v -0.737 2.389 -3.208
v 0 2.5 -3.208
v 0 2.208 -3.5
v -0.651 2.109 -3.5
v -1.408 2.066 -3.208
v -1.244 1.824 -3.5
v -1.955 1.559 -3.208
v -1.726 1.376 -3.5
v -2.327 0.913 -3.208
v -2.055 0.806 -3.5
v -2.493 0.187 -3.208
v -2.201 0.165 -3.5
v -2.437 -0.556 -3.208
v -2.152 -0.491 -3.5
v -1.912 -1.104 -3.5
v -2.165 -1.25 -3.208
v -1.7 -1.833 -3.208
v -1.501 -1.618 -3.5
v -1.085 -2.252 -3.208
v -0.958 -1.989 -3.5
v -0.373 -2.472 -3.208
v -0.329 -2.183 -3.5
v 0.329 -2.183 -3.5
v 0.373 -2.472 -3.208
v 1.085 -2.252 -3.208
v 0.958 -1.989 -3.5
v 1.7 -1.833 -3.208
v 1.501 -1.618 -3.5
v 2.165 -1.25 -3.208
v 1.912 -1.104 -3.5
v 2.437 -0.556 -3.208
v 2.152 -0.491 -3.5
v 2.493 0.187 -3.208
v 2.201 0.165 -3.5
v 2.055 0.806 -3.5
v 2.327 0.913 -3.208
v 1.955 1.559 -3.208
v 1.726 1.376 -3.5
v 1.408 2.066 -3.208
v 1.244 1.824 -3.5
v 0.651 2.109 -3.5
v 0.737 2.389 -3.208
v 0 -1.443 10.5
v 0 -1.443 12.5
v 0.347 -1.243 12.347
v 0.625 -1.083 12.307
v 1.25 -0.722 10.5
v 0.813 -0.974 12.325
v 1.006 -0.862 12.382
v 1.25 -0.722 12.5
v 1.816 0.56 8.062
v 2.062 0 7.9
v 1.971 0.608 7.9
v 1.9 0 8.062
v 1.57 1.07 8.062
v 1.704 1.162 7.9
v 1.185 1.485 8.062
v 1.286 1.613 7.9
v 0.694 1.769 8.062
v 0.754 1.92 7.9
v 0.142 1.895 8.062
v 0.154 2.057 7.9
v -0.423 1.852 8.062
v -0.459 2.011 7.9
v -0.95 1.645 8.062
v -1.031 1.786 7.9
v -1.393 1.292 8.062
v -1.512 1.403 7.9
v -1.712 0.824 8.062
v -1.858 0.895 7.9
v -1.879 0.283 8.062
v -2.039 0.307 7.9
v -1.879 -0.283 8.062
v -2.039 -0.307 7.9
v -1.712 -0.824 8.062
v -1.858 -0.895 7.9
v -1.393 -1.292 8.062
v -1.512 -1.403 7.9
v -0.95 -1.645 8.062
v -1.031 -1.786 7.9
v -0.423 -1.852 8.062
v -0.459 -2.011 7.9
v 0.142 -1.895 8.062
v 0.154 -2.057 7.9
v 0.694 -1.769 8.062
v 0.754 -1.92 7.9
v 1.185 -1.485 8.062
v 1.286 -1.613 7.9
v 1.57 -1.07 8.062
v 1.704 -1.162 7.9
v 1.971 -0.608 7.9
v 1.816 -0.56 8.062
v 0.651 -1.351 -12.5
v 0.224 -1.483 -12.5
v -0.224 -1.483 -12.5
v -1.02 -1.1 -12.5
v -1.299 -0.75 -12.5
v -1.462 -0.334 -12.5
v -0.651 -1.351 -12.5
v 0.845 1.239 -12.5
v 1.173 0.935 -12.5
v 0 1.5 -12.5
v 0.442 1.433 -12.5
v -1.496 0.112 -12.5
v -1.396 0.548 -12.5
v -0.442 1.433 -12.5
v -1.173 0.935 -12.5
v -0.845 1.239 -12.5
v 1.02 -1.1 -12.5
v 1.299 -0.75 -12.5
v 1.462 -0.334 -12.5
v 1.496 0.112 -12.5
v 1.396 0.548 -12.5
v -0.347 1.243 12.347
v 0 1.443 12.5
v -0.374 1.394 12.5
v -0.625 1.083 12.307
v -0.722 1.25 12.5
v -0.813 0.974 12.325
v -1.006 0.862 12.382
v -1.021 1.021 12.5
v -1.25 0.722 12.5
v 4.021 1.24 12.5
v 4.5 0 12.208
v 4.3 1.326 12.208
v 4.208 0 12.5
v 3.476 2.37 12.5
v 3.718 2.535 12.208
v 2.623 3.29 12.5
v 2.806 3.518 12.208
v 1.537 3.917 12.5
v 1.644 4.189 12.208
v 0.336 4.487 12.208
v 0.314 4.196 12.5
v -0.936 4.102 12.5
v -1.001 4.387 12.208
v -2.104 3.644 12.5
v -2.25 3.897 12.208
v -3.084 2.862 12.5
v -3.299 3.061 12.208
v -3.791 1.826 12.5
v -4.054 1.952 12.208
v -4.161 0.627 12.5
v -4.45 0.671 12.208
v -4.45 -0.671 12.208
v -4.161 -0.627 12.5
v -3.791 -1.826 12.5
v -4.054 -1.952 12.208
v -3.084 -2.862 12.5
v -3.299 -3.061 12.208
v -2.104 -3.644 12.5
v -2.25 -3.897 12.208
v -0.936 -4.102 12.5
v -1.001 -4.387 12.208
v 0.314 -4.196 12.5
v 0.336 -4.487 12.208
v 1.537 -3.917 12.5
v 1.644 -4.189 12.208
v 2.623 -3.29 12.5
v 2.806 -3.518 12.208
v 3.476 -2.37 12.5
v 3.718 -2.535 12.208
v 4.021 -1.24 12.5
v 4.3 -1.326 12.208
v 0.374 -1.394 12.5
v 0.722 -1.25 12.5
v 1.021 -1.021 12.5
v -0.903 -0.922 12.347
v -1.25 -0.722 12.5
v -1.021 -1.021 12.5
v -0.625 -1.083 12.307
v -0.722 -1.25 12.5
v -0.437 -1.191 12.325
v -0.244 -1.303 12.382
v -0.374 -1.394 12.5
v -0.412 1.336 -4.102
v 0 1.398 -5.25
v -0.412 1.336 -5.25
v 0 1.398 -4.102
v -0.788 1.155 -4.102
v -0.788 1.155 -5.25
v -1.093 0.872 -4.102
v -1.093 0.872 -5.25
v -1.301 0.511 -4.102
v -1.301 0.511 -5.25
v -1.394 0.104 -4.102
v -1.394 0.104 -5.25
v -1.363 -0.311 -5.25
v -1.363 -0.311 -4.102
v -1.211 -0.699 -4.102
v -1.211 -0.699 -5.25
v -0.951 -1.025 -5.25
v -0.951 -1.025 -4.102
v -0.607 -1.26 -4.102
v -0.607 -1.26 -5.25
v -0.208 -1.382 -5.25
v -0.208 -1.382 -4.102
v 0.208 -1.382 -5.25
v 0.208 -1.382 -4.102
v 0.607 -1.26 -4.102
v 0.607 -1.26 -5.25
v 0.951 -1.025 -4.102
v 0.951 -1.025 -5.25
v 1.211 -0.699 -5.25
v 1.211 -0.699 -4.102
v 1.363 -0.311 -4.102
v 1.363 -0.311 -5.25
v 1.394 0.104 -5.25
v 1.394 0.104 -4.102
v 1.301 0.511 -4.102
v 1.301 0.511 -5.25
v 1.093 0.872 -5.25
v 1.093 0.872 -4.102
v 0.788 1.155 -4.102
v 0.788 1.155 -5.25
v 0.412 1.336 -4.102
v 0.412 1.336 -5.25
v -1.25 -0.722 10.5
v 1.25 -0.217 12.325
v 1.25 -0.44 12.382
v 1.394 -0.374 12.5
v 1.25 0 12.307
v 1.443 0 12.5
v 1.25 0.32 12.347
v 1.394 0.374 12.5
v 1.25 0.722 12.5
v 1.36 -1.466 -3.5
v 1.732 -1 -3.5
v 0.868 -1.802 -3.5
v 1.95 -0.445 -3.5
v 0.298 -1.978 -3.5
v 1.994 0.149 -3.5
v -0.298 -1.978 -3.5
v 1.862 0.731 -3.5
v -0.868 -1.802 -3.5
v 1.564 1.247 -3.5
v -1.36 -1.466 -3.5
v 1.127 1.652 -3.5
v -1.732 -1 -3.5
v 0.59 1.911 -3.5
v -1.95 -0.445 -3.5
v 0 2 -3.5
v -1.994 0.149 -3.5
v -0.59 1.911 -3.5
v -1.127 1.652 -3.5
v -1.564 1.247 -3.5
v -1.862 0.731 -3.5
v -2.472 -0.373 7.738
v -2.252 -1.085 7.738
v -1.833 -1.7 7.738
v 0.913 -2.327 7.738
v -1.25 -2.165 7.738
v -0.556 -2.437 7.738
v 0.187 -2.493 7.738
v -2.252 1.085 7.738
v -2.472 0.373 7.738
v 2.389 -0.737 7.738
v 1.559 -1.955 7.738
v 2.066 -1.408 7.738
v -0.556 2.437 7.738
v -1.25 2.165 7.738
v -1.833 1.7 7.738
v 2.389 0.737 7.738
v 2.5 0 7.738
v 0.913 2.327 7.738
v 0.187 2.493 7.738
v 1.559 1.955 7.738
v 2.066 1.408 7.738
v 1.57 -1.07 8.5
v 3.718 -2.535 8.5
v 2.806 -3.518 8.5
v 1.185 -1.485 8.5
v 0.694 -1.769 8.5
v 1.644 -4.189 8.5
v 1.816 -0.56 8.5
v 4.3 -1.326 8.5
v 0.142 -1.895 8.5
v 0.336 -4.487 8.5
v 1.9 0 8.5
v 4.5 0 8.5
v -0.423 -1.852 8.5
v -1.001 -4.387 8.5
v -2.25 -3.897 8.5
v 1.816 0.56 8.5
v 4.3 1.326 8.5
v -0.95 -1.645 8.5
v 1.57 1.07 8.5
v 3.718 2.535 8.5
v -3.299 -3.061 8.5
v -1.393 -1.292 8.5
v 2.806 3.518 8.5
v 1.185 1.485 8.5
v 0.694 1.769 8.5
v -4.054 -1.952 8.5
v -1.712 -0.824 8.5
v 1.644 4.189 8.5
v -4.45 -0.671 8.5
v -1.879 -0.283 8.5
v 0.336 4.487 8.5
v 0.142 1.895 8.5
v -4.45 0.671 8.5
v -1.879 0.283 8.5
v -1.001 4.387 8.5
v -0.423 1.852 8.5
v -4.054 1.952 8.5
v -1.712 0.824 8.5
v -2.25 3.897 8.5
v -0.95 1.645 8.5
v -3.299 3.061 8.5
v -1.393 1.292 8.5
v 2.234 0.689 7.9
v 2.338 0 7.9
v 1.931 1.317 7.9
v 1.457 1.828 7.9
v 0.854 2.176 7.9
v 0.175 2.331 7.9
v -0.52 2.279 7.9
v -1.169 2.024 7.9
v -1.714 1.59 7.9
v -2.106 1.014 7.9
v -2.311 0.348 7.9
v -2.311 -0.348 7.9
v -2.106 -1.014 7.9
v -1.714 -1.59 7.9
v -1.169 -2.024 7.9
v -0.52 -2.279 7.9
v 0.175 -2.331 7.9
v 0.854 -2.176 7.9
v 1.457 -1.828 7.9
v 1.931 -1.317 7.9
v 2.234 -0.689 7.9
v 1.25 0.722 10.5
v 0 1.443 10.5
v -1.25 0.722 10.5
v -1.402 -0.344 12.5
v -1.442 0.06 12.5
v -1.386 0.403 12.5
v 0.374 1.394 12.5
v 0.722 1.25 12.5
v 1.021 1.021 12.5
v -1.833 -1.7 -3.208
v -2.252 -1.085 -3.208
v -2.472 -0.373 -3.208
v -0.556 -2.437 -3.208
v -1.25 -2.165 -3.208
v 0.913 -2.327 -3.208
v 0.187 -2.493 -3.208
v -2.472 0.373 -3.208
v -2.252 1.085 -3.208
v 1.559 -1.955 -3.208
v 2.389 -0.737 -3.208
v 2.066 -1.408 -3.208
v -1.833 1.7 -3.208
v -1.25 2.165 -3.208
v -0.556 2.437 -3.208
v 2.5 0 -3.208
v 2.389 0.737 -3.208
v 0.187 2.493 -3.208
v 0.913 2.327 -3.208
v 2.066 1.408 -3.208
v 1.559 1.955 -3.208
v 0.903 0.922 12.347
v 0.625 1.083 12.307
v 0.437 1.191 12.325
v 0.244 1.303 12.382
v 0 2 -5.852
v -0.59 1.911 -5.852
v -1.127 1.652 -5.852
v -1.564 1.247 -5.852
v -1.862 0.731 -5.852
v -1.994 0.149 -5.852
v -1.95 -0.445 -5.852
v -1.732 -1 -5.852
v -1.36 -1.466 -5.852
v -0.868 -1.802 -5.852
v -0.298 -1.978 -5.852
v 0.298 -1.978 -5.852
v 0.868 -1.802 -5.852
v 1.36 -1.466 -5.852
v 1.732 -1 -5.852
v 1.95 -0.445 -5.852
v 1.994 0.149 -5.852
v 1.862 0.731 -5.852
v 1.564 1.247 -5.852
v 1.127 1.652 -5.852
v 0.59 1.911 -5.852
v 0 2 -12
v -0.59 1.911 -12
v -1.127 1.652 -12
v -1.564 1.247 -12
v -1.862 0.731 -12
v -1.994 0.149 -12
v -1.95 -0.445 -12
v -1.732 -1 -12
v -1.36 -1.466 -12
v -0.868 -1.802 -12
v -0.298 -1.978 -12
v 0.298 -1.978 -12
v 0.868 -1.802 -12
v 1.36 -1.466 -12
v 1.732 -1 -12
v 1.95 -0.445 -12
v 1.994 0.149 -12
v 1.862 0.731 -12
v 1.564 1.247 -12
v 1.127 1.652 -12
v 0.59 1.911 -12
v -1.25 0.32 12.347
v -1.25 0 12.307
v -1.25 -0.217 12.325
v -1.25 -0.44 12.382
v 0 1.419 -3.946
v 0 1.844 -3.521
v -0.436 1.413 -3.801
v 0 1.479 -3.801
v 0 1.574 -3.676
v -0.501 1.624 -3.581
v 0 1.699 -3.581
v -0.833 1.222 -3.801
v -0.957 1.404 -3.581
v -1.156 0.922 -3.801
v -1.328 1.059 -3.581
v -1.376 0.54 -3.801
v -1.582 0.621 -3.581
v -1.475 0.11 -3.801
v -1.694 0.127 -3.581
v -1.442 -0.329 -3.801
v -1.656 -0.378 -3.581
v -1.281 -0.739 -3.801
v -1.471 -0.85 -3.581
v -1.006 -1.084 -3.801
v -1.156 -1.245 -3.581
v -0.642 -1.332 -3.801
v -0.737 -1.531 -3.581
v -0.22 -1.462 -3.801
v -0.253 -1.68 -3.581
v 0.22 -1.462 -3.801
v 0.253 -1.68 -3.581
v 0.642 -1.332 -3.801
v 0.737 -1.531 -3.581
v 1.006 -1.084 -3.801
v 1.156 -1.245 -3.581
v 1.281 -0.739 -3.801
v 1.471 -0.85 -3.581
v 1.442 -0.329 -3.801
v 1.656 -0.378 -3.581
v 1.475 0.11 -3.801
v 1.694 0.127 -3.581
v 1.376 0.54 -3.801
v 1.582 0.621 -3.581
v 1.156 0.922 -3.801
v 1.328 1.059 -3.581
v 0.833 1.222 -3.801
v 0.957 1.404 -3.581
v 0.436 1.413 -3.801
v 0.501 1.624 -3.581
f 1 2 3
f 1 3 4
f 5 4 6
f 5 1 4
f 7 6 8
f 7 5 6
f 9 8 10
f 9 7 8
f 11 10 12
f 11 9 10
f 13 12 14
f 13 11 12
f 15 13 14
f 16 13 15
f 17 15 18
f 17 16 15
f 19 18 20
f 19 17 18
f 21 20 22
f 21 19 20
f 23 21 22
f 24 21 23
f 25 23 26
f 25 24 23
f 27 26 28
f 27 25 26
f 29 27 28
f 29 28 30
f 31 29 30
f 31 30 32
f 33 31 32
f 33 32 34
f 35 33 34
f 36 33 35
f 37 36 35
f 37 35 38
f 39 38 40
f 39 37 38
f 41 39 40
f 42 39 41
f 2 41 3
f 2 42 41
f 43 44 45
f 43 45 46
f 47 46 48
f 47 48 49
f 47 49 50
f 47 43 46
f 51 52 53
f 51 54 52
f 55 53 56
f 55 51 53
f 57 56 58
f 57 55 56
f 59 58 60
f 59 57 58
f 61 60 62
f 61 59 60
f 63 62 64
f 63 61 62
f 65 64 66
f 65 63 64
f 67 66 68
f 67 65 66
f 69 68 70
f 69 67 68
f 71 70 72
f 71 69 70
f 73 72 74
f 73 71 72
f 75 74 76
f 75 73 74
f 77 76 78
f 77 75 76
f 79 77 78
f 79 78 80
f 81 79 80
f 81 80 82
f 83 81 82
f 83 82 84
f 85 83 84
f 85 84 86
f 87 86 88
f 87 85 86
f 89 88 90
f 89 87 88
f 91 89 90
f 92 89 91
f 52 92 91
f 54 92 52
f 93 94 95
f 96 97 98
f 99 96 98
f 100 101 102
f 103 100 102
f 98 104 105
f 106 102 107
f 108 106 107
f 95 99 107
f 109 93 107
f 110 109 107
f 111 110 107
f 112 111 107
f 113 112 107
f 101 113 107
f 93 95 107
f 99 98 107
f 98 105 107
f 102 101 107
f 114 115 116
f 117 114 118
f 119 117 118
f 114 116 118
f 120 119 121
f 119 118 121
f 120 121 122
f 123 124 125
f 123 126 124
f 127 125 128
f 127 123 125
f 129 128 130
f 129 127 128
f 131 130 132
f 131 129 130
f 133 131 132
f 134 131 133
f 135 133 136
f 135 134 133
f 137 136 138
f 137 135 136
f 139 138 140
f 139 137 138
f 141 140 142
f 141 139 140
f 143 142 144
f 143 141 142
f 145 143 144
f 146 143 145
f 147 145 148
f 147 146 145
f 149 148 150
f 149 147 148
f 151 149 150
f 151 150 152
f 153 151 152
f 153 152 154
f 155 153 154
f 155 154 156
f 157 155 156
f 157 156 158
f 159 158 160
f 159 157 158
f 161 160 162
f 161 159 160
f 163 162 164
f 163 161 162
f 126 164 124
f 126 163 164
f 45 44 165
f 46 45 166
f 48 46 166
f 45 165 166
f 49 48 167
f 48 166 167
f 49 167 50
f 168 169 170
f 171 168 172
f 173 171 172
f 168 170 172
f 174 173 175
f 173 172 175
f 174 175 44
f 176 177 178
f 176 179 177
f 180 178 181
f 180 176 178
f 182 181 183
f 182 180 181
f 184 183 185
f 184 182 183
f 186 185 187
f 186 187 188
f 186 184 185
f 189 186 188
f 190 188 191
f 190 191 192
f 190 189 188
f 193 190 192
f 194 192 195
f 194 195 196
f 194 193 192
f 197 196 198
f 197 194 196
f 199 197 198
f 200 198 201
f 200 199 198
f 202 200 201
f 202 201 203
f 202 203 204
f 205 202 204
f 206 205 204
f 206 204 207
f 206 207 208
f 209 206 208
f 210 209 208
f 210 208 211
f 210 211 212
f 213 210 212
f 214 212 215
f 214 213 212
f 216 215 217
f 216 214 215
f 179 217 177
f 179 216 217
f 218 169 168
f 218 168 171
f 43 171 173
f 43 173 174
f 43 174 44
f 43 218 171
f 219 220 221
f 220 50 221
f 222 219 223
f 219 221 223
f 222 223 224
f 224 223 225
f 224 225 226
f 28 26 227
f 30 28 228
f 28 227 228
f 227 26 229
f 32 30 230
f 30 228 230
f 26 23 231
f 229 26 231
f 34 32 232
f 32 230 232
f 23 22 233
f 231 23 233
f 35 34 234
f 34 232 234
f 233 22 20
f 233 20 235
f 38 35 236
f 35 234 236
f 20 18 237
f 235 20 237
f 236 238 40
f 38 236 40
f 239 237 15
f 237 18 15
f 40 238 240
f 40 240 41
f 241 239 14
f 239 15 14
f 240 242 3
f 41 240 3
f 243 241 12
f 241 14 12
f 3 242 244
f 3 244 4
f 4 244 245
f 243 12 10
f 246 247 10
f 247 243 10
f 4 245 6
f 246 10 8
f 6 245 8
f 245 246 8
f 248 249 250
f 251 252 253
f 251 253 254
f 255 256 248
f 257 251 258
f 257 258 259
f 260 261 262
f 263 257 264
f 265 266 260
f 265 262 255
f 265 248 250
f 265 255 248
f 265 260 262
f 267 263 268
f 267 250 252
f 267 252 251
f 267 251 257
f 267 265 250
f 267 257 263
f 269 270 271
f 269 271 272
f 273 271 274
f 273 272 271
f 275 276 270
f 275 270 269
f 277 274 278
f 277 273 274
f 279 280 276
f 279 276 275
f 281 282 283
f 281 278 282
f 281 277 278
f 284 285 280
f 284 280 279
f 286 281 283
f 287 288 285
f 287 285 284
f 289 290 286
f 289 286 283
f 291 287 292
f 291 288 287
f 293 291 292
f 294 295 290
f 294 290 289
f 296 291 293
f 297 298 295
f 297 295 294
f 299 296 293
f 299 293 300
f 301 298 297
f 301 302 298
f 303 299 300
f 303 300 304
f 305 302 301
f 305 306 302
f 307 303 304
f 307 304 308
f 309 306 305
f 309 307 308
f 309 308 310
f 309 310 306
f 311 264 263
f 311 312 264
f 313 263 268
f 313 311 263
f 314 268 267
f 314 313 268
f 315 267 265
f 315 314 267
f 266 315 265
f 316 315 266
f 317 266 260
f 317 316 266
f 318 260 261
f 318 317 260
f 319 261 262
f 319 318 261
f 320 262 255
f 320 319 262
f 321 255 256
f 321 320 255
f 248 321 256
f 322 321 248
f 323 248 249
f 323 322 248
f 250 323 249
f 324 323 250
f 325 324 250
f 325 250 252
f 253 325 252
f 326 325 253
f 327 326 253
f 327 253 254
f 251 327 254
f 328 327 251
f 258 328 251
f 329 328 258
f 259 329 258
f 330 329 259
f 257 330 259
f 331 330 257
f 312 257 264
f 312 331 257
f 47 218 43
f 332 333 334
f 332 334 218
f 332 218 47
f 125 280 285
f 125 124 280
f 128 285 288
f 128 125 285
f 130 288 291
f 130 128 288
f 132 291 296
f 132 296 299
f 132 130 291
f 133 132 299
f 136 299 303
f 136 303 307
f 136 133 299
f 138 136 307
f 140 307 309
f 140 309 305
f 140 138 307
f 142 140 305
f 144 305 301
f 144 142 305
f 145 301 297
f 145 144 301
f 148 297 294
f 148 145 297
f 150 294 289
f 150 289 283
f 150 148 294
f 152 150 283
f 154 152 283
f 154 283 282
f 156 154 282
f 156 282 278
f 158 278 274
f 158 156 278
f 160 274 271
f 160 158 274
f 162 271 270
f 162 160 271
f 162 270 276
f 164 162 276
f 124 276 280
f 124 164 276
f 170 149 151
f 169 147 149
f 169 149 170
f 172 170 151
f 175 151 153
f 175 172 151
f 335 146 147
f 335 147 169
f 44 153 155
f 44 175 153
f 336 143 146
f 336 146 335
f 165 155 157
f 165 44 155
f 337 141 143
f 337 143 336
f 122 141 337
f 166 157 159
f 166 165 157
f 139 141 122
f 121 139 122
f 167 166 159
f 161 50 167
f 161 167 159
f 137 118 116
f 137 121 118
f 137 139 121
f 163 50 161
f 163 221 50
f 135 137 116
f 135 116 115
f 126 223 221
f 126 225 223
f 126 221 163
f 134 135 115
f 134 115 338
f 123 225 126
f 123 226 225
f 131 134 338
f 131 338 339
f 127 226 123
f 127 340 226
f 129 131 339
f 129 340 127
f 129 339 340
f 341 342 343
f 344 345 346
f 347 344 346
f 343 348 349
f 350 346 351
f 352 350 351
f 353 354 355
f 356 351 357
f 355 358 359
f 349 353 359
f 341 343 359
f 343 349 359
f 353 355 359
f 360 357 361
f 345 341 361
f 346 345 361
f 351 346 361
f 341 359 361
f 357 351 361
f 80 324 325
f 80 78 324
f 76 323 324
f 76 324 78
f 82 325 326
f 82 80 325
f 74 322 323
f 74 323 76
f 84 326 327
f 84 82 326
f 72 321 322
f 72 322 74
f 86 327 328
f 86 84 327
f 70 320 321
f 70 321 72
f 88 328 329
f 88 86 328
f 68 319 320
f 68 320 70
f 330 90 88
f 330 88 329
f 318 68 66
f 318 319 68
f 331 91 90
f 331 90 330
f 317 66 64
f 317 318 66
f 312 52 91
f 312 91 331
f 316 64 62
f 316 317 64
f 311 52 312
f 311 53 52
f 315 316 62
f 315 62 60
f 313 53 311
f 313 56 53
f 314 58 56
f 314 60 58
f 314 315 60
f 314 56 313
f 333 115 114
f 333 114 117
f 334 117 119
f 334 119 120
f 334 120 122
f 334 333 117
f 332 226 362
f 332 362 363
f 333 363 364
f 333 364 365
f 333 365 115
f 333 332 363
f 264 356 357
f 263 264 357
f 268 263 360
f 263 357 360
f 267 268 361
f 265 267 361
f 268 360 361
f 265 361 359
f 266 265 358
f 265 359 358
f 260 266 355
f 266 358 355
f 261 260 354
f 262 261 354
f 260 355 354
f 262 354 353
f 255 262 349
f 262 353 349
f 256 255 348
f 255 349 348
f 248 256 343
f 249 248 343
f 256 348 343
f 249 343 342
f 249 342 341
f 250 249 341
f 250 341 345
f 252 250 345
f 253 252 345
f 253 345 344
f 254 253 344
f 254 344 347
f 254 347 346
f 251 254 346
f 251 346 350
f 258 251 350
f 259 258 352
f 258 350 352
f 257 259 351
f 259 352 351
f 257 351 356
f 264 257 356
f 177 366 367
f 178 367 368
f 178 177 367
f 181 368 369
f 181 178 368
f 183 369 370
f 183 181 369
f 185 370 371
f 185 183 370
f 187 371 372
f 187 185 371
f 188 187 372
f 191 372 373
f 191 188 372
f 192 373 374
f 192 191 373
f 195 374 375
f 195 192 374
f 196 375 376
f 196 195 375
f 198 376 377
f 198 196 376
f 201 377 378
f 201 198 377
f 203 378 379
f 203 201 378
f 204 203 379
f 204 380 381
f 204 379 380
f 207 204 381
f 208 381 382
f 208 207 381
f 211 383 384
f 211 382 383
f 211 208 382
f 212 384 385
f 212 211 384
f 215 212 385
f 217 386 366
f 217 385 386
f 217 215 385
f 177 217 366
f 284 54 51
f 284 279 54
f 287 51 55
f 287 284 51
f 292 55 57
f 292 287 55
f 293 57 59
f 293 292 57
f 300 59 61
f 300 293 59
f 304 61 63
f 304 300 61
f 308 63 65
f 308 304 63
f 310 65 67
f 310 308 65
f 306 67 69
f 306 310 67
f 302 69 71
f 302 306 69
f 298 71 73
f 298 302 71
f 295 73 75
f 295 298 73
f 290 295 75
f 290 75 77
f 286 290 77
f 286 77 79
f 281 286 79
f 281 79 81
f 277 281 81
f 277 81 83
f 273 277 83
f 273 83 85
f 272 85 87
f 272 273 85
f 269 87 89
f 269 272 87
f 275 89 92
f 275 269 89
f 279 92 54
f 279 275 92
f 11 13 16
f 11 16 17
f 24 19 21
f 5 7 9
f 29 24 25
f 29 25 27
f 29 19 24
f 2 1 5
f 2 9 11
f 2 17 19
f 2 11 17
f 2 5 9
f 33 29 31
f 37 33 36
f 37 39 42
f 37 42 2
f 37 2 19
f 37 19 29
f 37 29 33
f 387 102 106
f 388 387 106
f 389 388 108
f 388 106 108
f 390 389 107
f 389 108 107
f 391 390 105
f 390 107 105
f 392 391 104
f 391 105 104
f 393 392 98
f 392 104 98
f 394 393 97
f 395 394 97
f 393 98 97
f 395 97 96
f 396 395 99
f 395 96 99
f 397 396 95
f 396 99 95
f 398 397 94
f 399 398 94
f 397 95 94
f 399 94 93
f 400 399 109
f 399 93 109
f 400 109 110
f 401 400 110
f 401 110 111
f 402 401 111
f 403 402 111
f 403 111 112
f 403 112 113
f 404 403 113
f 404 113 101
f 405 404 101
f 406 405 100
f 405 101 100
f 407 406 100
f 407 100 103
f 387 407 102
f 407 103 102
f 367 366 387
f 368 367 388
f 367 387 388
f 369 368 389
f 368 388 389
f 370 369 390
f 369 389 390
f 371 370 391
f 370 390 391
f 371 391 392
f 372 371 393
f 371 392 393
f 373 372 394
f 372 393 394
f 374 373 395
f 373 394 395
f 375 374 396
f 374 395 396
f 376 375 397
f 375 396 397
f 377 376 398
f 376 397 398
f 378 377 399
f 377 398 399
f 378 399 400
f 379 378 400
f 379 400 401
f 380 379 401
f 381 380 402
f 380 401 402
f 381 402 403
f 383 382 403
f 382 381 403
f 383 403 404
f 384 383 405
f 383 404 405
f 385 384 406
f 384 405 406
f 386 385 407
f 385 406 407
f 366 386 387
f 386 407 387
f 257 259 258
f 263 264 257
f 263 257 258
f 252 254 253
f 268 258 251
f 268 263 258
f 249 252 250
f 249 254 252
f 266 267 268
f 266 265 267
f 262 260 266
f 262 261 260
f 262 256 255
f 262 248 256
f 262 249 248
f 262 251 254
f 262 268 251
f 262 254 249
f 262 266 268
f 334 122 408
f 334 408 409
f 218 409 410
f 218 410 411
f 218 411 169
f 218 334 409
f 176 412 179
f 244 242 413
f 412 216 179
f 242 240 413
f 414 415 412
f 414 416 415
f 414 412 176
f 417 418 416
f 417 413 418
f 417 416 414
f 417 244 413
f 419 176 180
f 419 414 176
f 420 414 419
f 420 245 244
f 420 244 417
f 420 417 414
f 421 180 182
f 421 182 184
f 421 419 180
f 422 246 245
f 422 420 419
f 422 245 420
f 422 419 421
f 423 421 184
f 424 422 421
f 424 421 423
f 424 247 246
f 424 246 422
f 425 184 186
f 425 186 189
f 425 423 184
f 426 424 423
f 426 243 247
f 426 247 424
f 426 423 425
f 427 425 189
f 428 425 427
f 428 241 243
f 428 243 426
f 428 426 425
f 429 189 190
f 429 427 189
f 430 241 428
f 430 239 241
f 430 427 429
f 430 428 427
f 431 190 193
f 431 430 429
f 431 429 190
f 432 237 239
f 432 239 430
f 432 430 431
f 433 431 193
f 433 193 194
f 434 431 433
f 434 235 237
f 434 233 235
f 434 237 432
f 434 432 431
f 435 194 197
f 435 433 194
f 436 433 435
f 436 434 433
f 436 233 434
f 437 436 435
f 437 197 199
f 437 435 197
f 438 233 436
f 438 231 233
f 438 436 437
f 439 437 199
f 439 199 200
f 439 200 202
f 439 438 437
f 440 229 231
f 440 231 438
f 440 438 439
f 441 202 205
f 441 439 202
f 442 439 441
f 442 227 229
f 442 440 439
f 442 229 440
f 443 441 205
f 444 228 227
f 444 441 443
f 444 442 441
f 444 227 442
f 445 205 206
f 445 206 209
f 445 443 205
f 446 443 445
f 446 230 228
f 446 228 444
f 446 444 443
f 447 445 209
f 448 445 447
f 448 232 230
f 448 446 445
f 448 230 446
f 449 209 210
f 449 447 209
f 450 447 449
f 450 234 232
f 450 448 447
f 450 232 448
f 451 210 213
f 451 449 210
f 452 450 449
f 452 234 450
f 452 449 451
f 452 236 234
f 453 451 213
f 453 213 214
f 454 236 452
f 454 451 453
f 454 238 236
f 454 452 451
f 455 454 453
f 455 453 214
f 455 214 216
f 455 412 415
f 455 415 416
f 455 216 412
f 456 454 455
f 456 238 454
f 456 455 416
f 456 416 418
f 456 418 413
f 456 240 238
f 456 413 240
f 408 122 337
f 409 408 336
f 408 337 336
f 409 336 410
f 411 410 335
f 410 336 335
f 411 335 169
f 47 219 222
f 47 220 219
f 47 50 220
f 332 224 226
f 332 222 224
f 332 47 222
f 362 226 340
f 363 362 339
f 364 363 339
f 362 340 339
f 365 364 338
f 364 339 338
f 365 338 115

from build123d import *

# Parameters (mm, degrees)
SKETCH4_W           = 0.6
SKETCH4_H           = 0.6
CHAMFER1_SIZE       = 0.1625
CHAMFER2_SIZE       = 0.5
CHAMFER3_SIZE       = 0.2925
CUT_EXTRUDE1_DEPTH  = 2
SPLIT2_START        = -3.2075
SPLIT2_OUTLINE_R    = 4.5
SPLIT2_DEPTH        = 15.7075
SPLIT2_START_2      = 10.5
SPLIT2_3_DEPTH      = 2
SPLIT2_10_OUTLINE_R = 2.5
SPLIT2_10_DEPTH     = 10.945


with BuildPart() as part:
    # Sketch3 → Revolve1 (revolve)
    with BuildSketch(Plane(origin=(0, 0, 0), x_dir=(0, 0, -1), z_dir=(1, 0, 0))):
        Polygon((-12.5, 4.5), (-8.5, 4.5), (-8.5, 2.5), (3.5, 2.5), (3.5, 2), (12.5, 2), (12.5, 0), (-12.5, 0), align=None)
    revolve(axis=Axis((0, 0, -12.5), (0, 0, 1)))

    # Sketch4 → Cut-Revolve1 (revolve, cut)
    with BuildSketch(Plane(origin=(0, 0, 0), x_dir=(0, 0, -1), z_dir=(1, 0, 0))):
        with Locations((-8.2, 2.2)):
            Rectangle(SKETCH4_W, SKETCH4_H)
    revolve(axis=Axis((0, 0, -12.5), (0, 0, 1)), mode=Mode.SUBTRACT)

    # Chamfer1
    chamfer1_edges = [part.edges().sort_by_distance(p)[0] for p in [
        (0, -1.9, 7.9),
        (0, -2.5, 7.9),
    ]]
    chamfer(chamfer1_edges, length=CHAMFER1_SIZE)

    # Sketch6 → Cut-Revolve2 (revolve, cut)
    with BuildSketch(Plane(origin=(0, 0, 0), x_dir=(0, 0, -1), z_dir=(1, 0, 0))):
        with BuildLine():
            Line((3.5, 2.5), (6.352, 2.5))
            Line((6.352, 2.5), (5.25, 1.398))
            Line((5.25, 1.398), (4.102, 1.398))
            ThreePointArc((4.102, 1.398), (3.676321718, 1.574321718), (3.5, 2))
            Line((3.5, 2), (3.5, 2.5))
        make_face()
    revolve(axis=Axis((0, 0, -12.5), (0, 0, 1)), mode=Mode.SUBTRACT)

    # Chamfer2
    chamfer2_edges = [part.edges().sort_by_distance(p)[0] for p in [
        (0, -2, -12.5),
    ]]
    chamfer(chamfer2_edges, length=CHAMFER2_SIZE)

    # Chamfer3
    chamfer3_edges = [part.edges().sort_by_distance(p)[0] for p in [
        (0, -2.5, -3.5),
        (0, -4.5, 12.5),
    ]]
    chamfer(chamfer3_edges, length=CHAMFER3_SIZE)

    # Sketch8 → Cut-Extrude1 (cut)
    with BuildSketch(Plane.XY.offset(12.5)):
        Polygon((1.25, 0.721687836), (0, 1.443375673), (-1.25, 0.721687836), (-1.25, -0.721687836), (0, -1.443375673), (1.25, -0.721687836), align=None)
    extrude(amount=-CUT_EXTRUDE1_DEPTH, mode=Mode.SUBTRACT)

    # Cut-Extrude2 cone 1 section (through the dimple's axis) → Cut-Extrude2 (revolve, cut)
    with BuildSketch(Plane(origin=(0, 0, 12.5), x_dir=(0, -1, 0), z_dir=(1, 0, 0))):
        Polygon((0, 0), (1.443375673, 0), (0, 1.443375673), align=None)
    revolve(axis=Axis((0, 0, 12.5), (0, 0, -1)), mode=Mode.SUBTRACT)

    # Split2: read off the stored shape, not the designer's step
    # Split2 outline → Split2 (cut)
    with BuildSketch(Plane.XY.offset(SPLIT2_START)):
        Circle(SPLIT2_OUTLINE_R)
    extrude(amount=SPLIT2_DEPTH, mode=Mode.SUBTRACT)


with BuildPart() as body_2:
    # Split2 2 outline → Split2 2 (revolve)
    with BuildSketch(Plane.XZ):
        Polygon((0, 12.500000022), (0, 7.7375), (2.5, 7.7375), (2.3375, 7.9), (2.0625, 7.9), (1.9, 8.0625), (1.9, 8.5), (4.5, 8.5), (4.5, 12.2075), (4.2075, 12.5), (1.443375689, 12.500000017), align=None)
    revolve(axis=Axis((0, 0, 0), (0, 0, 1)))

    # Split2 3 outline → Split2 3 (cut)
    with BuildSketch(Plane.XY.offset(SPLIT2_START_2)):
        Polygon((1.25, -0.721687836), (1.25, 0.721687836), (0, 1.443375673), (-1.25, 0.721687836), (-1.25, -0.721687836), (0, -1.443375673), align=None)
    extrude(amount=SPLIT2_3_DEPTH, mode=Mode.SUBTRACT)

    # Split2 4: loft between two sections, ruled curve by curve
    split2_4_from = [
        Edge.make_three_point_arc((1.08239615, 0.624921709, 12.306467745), (0.624921709, 1.08239615, 12.306467745), (0, 1.249843418, 12.306467745)),
        Edge.make_line((0, 1.249843418, 12.306467745), (1.08239615, 0.624921709, 12.306467745)),
    ]
    split2_4_to = [
        Edge.make_three_point_arc((1.250000029, 0.721687853, 12.500000033), (0.721687853, 1.250000029, 12.500000033), (0, 1.443375706, 12.500000033)),
        Edge.make_line((0, 1.443375706, 12.500000033), (1.250000029, 0.721687853, 12.500000033)),
    ]
    split2_4 = Solid(Shell([*[Face.make_surface_from_curves(split2_4_from[k], split2_4_to[k]) for k in range(2)], Face(Wire(split2_4_from)), Face(Wire(split2_4_to))]))
    add(split2_4, mode=Mode.SUBTRACT)

    # Split2 5: loft between two sections, ruled curve by curve
    split2_5_from = [
        Edge.make_three_point_arc((0, 1.249843418, 12.306467745), (-0.624921709, 1.08239615, 12.306467745), (-1.08239615, 0.624921709, 12.306467745)),
        Edge.make_line((-1.08239615, 0.624921709, 12.306467745), (0, 1.249843418, 12.306467745)),
    ]
    split2_5_to = [
        Edge.make_three_point_arc((0, 1.443375706, 12.500000033), (-0.721687853, 1.250000029, 12.500000033), (-1.250000029, 0.721687853, 12.500000033)),
        Edge.make_line((-1.250000029, 0.721687853, 12.500000033), (0, 1.443375706, 12.500000033)),
    ]
    split2_5 = Solid(Shell([*[Face.make_surface_from_curves(split2_5_from[k], split2_5_to[k]) for k in range(2)], Face(Wire(split2_5_from)), Face(Wire(split2_5_to))]))
    add(split2_5, mode=Mode.SUBTRACT)

    # Split2 6: loft between two sections, ruled curve by curve
    split2_6_from = [
        Edge.make_three_point_arc((-1.082395782, 0.624921515, 12.306467329), (-1.249843002, -4.66e-07, 12.306467329), (-1.082395316, -0.624922322, 12.306467329)),
        Edge.make_line((-1.082395316, -0.624922322, 12.306467329), (-1.082395782, 0.624921515, 12.306467329)),
    ]
    split2_6_to = [
        Edge.make_three_point_arc((-1.249999991, 0.721687853, 12.5), (-1.443375673, -5.38e-07, 12.5), (-1.249999452, -0.721688785, 12.5)),
        Edge.make_line((-1.249999452, -0.721688785, 12.5), (-1.249999991, 0.721687853, 12.5)),
    ]
    split2_6 = Solid(Shell([*[Face.make_surface_from_curves(split2_6_from[k], split2_6_to[k]) for k in range(2)], Face(Wire(split2_6_from)), Face(Wire(split2_6_to))]))
    add(split2_6, mode=Mode.SUBTRACT)

    # Split2 7: loft between two sections, ruled curve by curve
    split2_7_from = [
        Edge.make_three_point_arc((-1.08239615, -0.624921709, 12.306467745), (-0.624921709, -1.08239615, 12.306467745), (0, -1.249843418, 12.306467745)),
        Edge.make_line((0, -1.249843418, 12.306467745), (-1.08239615, -0.624921709, 12.306467745)),
    ]
    split2_7_to = [
        Edge.make_three_point_arc((-1.250000029, -0.721687853, 12.500000033), (-0.721687853, -1.250000029, 12.500000033), (0, -1.443375706, 12.500000033)),
        Edge.make_line((0, -1.443375706, 12.500000033), (-1.250000029, -0.721687853, 12.500000033)),
    ]
    split2_7 = Solid(Shell([*[Face.make_surface_from_curves(split2_7_from[k], split2_7_to[k]) for k in range(2)], Face(Wire(split2_7_from)), Face(Wire(split2_7_to))]))
    add(split2_7, mode=Mode.SUBTRACT)

    # Split2 8: loft between two sections, ruled curve by curve
    split2_8_from = [
        Edge.make_three_point_arc((0, -1.249843418, 12.306467745), (0.624921709, -1.08239615, 12.306467745), (1.08239615, -0.624921709, 12.306467745)),
        Edge.make_line((1.08239615, -0.624921709, 12.306467745), (0, -1.249843418, 12.306467745)),
    ]
    split2_8_to = [
        Edge.make_three_point_arc((0, -1.443375706, 12.500000033), (0.721687853, -1.250000029, 12.500000033), (1.250000029, -0.721687853, 12.500000033)),
        Edge.make_line((1.250000029, -0.721687853, 12.500000033), (0, -1.443375706, 12.500000033)),
    ]
    split2_8 = Solid(Shell([*[Face.make_surface_from_curves(split2_8_from[k], split2_8_to[k]) for k in range(2)], Face(Wire(split2_8_from)), Face(Wire(split2_8_to))]))
    add(split2_8, mode=Mode.SUBTRACT)

    # Split2 9: loft between two sections, ruled curve by curve
    split2_9_from = [
        Edge.make_three_point_arc((1.082395316, -0.624922322, 12.306467329), (1.249843002, -4.66e-07, 12.306467329), (1.082395782, 0.624921515, 12.306467329)),
        Edge.make_line((1.082395782, 0.624921515, 12.306467329), (1.082395316, -0.624922322, 12.306467329)),
    ]
    split2_9_to = [
        Edge.make_three_point_arc((1.249999452, -0.721688785, 12.5), (1.443375673, -5.38e-07, 12.5), (1.249999991, 0.721687853, 12.5)),
        Edge.make_line((1.249999991, 0.721687853, 12.5), (1.249999452, -0.721688785, 12.5)),
    ]
    split2_9 = Solid(Shell([*[Face.make_surface_from_curves(split2_9_from[k], split2_9_to[k]) for k in range(2)], Face(Wire(split2_9_from)), Face(Wire(split2_9_to))]))
    add(split2_9, mode=Mode.SUBTRACT)


with BuildPart() as body_3:
    # Split2 10 outline → Split2 10 (new body)
    with BuildSketch(Plane.XY.offset(SPLIT2_START)):
        Circle(SPLIT2_10_OUTLINE_R)
    extrude(amount=SPLIT2_10_DEPTH)


solid = Compound([part.part, body_2.part, body_3.part])
